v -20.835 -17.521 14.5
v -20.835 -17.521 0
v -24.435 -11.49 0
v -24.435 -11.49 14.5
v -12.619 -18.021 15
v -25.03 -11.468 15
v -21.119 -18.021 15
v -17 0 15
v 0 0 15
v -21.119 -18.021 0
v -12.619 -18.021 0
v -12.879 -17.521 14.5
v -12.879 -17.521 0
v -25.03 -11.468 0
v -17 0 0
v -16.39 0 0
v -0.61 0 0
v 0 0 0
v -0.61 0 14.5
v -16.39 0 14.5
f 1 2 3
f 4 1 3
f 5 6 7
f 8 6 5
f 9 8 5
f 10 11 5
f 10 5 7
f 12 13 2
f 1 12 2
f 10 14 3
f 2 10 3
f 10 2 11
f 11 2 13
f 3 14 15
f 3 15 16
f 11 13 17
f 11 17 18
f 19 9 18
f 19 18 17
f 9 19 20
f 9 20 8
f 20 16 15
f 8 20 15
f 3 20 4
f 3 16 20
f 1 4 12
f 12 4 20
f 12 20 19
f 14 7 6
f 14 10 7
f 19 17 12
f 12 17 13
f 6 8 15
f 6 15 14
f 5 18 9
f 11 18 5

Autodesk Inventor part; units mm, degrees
ref_plane "YZ Plane" through (0, 0, 0) normal (1, 0, 0) x (0, 1, 0)
ref_plane "XZ Plane" through (0, 0, 0) normal (0, 1, 0) x (-1, 0, 0)
ref_plane "XY Plane" through (0, 0, 0) normal (0, 0, 1) x (1, 0, 0)
sketch "Sketch1" plane through (0, 0, 0) normal (0, 0, 1) x (1, 0, 0)
  line L0 (0, 0) -> (-17, 0)
  line L1 (-17, 0) -> (-25.0301, -11.4681)
  line L2 (0, 0) -> (-12.6187, -18.0213)
  line L3 (0, 0) -> (22, 0) construction
  line L4 (-12.6187, -18.0213) -> (-21.1187, -18.0213)
  line L5 (-21.1187, -18.0213) -> (-25.0301, -11.4681)
  dimension "d40" = 17
  dimension "d41" = 14
  dimension "d42" = 125
  dimension "d43" = 22
  dimension "d44" = 125
  dimension "d45" = 8.5
extrude "Extrusion1" add sketch "Sketch1" along normal blind 15
shell "Shell1" thickness 0.5 removed faces 2 at (-5.6667, 0, 5) at (-9.8729, -6.0071, 0)
properties part number "metal_shielding"
